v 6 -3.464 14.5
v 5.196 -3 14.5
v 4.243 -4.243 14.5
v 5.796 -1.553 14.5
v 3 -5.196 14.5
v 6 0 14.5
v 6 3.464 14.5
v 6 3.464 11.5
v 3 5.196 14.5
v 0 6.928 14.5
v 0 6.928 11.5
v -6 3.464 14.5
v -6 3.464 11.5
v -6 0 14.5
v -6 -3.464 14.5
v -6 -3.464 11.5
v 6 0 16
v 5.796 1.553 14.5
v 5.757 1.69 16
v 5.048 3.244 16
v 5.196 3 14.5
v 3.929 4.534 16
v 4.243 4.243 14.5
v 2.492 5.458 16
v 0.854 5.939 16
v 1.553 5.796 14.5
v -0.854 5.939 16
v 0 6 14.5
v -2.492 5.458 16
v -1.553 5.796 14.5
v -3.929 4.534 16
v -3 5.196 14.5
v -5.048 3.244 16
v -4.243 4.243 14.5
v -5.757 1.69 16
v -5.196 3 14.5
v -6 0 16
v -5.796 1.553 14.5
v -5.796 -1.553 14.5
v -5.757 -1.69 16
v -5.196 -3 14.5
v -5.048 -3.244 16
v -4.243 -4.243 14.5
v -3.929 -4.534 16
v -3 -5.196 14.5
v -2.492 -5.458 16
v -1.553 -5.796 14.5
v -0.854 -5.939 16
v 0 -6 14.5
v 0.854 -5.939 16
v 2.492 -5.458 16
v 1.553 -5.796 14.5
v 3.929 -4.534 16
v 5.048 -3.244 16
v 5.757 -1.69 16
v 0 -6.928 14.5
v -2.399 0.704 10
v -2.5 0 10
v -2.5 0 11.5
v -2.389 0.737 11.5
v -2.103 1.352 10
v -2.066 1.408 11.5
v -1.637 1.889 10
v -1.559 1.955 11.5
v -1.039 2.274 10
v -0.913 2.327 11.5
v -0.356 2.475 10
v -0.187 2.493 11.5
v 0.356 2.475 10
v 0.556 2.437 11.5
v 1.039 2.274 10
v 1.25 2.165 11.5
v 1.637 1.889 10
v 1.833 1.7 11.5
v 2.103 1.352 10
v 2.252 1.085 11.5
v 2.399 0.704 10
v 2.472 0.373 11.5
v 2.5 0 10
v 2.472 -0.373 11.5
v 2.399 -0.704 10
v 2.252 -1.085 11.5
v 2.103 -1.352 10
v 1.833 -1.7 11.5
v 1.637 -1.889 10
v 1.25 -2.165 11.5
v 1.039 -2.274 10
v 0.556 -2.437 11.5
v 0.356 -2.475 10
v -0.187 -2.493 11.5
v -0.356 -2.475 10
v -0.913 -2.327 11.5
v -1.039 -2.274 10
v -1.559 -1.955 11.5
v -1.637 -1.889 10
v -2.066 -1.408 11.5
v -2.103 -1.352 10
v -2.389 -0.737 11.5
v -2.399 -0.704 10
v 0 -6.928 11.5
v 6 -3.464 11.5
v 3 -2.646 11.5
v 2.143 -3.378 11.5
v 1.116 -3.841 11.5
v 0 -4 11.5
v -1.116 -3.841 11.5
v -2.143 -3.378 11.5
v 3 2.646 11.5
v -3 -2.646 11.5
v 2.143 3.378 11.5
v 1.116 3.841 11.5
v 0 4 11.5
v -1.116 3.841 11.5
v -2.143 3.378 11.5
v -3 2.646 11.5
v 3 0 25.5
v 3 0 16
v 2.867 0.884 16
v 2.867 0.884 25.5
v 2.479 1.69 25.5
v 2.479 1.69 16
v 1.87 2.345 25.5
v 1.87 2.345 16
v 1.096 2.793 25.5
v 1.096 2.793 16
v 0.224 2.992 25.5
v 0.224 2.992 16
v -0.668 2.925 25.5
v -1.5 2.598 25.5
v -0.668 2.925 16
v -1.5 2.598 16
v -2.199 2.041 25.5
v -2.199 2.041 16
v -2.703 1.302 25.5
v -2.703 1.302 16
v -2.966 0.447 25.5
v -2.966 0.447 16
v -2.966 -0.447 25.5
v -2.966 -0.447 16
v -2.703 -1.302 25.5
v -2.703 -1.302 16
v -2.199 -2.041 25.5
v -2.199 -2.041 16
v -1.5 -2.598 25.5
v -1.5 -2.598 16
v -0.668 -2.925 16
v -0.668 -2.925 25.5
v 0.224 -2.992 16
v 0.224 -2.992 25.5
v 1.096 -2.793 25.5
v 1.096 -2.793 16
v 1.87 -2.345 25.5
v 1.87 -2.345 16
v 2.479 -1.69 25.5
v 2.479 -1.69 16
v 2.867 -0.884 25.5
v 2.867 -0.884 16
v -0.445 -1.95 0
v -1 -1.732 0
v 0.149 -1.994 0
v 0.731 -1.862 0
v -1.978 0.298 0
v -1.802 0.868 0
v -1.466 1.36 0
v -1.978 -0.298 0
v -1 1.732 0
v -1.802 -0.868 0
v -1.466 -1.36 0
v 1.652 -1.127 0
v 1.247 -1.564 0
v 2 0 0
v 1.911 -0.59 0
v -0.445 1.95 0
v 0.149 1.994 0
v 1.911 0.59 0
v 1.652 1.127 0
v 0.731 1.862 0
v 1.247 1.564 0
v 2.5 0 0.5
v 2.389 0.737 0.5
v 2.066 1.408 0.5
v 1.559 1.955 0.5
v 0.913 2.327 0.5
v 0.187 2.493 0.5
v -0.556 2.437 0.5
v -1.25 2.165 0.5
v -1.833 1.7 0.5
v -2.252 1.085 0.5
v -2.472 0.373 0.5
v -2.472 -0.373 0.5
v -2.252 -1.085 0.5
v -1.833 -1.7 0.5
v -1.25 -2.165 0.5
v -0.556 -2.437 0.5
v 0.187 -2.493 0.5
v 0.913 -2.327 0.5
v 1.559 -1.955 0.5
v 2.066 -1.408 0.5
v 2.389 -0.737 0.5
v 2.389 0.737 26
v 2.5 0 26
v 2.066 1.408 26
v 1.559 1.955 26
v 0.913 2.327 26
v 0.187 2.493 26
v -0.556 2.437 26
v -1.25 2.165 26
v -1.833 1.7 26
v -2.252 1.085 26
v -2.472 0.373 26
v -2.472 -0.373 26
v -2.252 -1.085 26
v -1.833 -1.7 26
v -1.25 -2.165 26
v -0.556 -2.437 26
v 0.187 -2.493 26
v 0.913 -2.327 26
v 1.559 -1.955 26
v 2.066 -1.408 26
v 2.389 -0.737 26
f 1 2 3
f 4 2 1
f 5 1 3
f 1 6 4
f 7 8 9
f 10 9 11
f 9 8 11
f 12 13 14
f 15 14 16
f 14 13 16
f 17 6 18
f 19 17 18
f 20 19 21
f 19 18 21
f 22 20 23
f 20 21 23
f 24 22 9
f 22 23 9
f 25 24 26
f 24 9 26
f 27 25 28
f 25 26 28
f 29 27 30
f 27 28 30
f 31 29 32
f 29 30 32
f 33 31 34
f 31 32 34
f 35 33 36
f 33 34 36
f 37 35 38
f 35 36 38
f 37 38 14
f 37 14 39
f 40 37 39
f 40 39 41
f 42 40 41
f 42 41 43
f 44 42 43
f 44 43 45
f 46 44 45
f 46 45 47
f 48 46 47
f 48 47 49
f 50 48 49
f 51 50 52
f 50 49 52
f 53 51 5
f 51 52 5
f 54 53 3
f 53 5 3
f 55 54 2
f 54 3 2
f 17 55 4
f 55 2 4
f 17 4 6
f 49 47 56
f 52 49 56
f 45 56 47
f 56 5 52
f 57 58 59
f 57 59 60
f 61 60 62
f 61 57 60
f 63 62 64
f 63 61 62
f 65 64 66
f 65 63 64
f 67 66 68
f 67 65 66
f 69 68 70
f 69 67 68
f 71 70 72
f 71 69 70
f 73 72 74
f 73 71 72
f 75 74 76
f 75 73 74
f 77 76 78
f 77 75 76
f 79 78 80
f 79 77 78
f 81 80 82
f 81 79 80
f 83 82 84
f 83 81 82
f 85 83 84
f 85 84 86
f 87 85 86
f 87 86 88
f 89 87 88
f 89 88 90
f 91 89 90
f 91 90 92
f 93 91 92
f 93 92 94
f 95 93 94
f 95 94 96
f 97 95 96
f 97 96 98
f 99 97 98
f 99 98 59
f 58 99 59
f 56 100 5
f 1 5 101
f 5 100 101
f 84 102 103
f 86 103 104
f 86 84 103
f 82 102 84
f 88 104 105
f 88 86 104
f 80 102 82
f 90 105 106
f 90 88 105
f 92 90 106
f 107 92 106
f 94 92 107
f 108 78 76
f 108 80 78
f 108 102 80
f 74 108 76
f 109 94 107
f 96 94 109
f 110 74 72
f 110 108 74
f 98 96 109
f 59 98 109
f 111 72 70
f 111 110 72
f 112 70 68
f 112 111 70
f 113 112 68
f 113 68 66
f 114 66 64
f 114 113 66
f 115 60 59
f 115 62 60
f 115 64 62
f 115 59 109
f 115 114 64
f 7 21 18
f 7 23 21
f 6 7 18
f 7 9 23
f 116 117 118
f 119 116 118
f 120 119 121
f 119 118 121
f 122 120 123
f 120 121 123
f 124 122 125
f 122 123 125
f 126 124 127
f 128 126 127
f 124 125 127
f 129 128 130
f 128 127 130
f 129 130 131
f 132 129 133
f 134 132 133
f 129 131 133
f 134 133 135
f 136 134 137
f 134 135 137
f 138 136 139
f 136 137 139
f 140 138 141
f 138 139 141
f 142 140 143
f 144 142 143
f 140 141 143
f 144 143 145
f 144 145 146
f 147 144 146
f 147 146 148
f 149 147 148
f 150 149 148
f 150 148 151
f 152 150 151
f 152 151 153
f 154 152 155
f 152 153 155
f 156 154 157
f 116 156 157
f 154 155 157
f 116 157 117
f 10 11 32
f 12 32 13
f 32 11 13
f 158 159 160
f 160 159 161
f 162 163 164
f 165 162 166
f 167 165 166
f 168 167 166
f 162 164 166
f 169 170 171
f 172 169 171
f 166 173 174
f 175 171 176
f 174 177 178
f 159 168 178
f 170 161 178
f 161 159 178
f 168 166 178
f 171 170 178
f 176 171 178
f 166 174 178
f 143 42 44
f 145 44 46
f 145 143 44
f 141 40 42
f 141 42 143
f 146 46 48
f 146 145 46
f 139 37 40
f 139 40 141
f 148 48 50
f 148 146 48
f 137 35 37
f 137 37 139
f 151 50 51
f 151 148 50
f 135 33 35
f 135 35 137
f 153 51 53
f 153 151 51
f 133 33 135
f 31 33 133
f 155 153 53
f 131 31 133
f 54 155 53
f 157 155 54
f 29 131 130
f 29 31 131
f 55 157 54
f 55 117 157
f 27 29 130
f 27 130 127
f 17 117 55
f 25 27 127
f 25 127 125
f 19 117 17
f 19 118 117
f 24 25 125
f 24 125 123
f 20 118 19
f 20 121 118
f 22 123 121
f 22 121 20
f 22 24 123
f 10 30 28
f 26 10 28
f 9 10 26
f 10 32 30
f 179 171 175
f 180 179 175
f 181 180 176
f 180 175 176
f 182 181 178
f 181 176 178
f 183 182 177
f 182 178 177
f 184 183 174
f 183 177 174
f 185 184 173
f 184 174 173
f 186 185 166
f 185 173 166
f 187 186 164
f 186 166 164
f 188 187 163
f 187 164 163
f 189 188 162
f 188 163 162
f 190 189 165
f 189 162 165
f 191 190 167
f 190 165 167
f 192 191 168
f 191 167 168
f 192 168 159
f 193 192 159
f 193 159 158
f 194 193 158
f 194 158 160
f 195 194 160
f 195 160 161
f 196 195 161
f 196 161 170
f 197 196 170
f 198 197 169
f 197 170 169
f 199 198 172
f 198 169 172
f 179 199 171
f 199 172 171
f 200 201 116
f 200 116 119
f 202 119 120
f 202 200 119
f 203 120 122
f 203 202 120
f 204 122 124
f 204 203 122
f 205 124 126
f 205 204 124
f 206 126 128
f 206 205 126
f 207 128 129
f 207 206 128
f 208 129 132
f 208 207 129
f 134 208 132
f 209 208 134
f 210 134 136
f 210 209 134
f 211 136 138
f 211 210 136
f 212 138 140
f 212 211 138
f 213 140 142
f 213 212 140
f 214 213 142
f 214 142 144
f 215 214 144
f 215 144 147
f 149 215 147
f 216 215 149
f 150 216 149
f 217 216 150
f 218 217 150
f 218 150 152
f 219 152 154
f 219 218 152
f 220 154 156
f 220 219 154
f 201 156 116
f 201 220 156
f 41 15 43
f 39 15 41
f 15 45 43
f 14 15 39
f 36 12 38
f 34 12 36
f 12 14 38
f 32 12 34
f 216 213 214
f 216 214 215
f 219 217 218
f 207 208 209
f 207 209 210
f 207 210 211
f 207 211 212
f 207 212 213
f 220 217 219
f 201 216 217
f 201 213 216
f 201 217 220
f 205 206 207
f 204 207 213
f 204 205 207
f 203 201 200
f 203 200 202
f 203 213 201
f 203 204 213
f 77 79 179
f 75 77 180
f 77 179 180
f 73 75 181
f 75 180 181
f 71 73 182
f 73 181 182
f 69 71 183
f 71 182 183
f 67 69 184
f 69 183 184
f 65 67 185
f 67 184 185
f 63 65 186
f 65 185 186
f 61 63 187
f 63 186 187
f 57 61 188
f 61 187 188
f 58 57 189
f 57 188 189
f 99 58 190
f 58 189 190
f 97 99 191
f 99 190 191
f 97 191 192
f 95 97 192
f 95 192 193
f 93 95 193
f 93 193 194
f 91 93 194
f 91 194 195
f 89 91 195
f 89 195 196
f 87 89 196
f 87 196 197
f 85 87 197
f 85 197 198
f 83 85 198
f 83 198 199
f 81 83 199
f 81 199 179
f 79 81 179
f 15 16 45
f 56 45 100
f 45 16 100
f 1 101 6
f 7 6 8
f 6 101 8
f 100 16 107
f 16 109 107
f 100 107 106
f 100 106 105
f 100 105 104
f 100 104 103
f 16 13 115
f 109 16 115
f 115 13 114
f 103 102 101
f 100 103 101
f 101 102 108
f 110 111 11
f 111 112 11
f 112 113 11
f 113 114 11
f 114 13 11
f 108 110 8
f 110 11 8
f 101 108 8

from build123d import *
from build123d.topology import SkipClean

# Parameters (mm, degrees)
SKETCH_1_R          = 2.5
EXTRUDE_228_DEPTH   = 10
EXTRUDE_1_DEPTH     = 1.5
EXTRUDE_2_DEPTH     = 3
SKETCH_4_R          = 6
EXTRUDE_3_DEPTH     = 1.5
SKETCH_5_R          = 3
EXTRUDE_4_DEPTH     = 10
CHAMFER_1_SIZE      = 0.5
SKETCH_6_R          = 2.5
CUT_EXTRUDE_2_DEPTH = 1.5


with BuildPart() as part:
    # Эскиз1 → Extrude 228 (new body)
    with BuildSketch(Plane.XY):
        Circle(SKETCH_1_R)
    extrude(amount=EXTRUDE_228_DEPTH)

    # Эскиз2 → Бобышка-Вытянуть1 (add)
    with BuildSketch(Plane.XY.offset(10)):
        with BuildLine():
            Line((-3, 2.645751311), (-3, -2.645751311))
            ThreePointArc((-3, -2.645751311), (0, -4), (3, -2.645751311))
            Line((3, -2.645751311), (3, 2.645751311))
            ThreePointArc((3, 2.645751311), (0, 4), (-3, 2.645751311))
        make_face()
    extrude(amount=EXTRUDE_1_DEPTH)

    # Эскиз3 → Бобышка-Вытянуть2 (add)
    with BuildSketch(Plane.XY.offset(11.5)):
        Polygon((0, -6.92820323), (6, -3.464101615), (6, 3.464101615), (0, 6.92820323), (-6, 3.464101615), (-6, -3.464101615), align=None)
    extrude(amount=EXTRUDE_2_DEPTH)

    # Эскиз4 → Бобышка-Вытянуть3 (add)
    with BuildSketch(Plane.XY.offset(14.5)):
        Circle(SKETCH_4_R)
    extrude(amount=EXTRUDE_3_DEPTH)

    # Эскиз5 → Бобышка-Вытянуть4 (add)
    with BuildSketch(Plane.XY.offset(16)):
        Circle(SKETCH_5_R)
    extrude(amount=EXTRUDE_4_DEPTH)

    # Фаска1
    chamfer_1_edges = [part.edges().sort_by_distance(p)[0] for p in [
        (-2.5, 0, 0),
        (-3, 0, 26),
    ]]
    chamfer(chamfer_1_edges, length=CHAMFER_1_SIZE)

    # Эскиз6 → Вырез-Вытянуть2 (cut)
    with SkipClean():  # the faces are left unmerged after this step: merging them gives an invalid solid
        with BuildSketch(Plane(origin=(0, 0, 10), x_dir=(-1, 0, 0), z_dir=(0, 0, -1))):
            with BuildLine():
                Line((-3, 2.645751311), (-3, -2.645751311))
                ThreePointArc((-3, -2.645751311), (0, -4), (3, -2.645751311))
                Line((3, -2.645751311), (3, 2.645751311))
                ThreePointArc((3, 2.645751311), (0, 4), (-3, 2.645751311))
            make_face()
            Circle(SKETCH_6_R, mode=Mode.SUBTRACT)
        extrude(amount=-CUT_EXTRUDE_2_DEPTH, mode=Mode.SUBTRACT)


solid = part.part
